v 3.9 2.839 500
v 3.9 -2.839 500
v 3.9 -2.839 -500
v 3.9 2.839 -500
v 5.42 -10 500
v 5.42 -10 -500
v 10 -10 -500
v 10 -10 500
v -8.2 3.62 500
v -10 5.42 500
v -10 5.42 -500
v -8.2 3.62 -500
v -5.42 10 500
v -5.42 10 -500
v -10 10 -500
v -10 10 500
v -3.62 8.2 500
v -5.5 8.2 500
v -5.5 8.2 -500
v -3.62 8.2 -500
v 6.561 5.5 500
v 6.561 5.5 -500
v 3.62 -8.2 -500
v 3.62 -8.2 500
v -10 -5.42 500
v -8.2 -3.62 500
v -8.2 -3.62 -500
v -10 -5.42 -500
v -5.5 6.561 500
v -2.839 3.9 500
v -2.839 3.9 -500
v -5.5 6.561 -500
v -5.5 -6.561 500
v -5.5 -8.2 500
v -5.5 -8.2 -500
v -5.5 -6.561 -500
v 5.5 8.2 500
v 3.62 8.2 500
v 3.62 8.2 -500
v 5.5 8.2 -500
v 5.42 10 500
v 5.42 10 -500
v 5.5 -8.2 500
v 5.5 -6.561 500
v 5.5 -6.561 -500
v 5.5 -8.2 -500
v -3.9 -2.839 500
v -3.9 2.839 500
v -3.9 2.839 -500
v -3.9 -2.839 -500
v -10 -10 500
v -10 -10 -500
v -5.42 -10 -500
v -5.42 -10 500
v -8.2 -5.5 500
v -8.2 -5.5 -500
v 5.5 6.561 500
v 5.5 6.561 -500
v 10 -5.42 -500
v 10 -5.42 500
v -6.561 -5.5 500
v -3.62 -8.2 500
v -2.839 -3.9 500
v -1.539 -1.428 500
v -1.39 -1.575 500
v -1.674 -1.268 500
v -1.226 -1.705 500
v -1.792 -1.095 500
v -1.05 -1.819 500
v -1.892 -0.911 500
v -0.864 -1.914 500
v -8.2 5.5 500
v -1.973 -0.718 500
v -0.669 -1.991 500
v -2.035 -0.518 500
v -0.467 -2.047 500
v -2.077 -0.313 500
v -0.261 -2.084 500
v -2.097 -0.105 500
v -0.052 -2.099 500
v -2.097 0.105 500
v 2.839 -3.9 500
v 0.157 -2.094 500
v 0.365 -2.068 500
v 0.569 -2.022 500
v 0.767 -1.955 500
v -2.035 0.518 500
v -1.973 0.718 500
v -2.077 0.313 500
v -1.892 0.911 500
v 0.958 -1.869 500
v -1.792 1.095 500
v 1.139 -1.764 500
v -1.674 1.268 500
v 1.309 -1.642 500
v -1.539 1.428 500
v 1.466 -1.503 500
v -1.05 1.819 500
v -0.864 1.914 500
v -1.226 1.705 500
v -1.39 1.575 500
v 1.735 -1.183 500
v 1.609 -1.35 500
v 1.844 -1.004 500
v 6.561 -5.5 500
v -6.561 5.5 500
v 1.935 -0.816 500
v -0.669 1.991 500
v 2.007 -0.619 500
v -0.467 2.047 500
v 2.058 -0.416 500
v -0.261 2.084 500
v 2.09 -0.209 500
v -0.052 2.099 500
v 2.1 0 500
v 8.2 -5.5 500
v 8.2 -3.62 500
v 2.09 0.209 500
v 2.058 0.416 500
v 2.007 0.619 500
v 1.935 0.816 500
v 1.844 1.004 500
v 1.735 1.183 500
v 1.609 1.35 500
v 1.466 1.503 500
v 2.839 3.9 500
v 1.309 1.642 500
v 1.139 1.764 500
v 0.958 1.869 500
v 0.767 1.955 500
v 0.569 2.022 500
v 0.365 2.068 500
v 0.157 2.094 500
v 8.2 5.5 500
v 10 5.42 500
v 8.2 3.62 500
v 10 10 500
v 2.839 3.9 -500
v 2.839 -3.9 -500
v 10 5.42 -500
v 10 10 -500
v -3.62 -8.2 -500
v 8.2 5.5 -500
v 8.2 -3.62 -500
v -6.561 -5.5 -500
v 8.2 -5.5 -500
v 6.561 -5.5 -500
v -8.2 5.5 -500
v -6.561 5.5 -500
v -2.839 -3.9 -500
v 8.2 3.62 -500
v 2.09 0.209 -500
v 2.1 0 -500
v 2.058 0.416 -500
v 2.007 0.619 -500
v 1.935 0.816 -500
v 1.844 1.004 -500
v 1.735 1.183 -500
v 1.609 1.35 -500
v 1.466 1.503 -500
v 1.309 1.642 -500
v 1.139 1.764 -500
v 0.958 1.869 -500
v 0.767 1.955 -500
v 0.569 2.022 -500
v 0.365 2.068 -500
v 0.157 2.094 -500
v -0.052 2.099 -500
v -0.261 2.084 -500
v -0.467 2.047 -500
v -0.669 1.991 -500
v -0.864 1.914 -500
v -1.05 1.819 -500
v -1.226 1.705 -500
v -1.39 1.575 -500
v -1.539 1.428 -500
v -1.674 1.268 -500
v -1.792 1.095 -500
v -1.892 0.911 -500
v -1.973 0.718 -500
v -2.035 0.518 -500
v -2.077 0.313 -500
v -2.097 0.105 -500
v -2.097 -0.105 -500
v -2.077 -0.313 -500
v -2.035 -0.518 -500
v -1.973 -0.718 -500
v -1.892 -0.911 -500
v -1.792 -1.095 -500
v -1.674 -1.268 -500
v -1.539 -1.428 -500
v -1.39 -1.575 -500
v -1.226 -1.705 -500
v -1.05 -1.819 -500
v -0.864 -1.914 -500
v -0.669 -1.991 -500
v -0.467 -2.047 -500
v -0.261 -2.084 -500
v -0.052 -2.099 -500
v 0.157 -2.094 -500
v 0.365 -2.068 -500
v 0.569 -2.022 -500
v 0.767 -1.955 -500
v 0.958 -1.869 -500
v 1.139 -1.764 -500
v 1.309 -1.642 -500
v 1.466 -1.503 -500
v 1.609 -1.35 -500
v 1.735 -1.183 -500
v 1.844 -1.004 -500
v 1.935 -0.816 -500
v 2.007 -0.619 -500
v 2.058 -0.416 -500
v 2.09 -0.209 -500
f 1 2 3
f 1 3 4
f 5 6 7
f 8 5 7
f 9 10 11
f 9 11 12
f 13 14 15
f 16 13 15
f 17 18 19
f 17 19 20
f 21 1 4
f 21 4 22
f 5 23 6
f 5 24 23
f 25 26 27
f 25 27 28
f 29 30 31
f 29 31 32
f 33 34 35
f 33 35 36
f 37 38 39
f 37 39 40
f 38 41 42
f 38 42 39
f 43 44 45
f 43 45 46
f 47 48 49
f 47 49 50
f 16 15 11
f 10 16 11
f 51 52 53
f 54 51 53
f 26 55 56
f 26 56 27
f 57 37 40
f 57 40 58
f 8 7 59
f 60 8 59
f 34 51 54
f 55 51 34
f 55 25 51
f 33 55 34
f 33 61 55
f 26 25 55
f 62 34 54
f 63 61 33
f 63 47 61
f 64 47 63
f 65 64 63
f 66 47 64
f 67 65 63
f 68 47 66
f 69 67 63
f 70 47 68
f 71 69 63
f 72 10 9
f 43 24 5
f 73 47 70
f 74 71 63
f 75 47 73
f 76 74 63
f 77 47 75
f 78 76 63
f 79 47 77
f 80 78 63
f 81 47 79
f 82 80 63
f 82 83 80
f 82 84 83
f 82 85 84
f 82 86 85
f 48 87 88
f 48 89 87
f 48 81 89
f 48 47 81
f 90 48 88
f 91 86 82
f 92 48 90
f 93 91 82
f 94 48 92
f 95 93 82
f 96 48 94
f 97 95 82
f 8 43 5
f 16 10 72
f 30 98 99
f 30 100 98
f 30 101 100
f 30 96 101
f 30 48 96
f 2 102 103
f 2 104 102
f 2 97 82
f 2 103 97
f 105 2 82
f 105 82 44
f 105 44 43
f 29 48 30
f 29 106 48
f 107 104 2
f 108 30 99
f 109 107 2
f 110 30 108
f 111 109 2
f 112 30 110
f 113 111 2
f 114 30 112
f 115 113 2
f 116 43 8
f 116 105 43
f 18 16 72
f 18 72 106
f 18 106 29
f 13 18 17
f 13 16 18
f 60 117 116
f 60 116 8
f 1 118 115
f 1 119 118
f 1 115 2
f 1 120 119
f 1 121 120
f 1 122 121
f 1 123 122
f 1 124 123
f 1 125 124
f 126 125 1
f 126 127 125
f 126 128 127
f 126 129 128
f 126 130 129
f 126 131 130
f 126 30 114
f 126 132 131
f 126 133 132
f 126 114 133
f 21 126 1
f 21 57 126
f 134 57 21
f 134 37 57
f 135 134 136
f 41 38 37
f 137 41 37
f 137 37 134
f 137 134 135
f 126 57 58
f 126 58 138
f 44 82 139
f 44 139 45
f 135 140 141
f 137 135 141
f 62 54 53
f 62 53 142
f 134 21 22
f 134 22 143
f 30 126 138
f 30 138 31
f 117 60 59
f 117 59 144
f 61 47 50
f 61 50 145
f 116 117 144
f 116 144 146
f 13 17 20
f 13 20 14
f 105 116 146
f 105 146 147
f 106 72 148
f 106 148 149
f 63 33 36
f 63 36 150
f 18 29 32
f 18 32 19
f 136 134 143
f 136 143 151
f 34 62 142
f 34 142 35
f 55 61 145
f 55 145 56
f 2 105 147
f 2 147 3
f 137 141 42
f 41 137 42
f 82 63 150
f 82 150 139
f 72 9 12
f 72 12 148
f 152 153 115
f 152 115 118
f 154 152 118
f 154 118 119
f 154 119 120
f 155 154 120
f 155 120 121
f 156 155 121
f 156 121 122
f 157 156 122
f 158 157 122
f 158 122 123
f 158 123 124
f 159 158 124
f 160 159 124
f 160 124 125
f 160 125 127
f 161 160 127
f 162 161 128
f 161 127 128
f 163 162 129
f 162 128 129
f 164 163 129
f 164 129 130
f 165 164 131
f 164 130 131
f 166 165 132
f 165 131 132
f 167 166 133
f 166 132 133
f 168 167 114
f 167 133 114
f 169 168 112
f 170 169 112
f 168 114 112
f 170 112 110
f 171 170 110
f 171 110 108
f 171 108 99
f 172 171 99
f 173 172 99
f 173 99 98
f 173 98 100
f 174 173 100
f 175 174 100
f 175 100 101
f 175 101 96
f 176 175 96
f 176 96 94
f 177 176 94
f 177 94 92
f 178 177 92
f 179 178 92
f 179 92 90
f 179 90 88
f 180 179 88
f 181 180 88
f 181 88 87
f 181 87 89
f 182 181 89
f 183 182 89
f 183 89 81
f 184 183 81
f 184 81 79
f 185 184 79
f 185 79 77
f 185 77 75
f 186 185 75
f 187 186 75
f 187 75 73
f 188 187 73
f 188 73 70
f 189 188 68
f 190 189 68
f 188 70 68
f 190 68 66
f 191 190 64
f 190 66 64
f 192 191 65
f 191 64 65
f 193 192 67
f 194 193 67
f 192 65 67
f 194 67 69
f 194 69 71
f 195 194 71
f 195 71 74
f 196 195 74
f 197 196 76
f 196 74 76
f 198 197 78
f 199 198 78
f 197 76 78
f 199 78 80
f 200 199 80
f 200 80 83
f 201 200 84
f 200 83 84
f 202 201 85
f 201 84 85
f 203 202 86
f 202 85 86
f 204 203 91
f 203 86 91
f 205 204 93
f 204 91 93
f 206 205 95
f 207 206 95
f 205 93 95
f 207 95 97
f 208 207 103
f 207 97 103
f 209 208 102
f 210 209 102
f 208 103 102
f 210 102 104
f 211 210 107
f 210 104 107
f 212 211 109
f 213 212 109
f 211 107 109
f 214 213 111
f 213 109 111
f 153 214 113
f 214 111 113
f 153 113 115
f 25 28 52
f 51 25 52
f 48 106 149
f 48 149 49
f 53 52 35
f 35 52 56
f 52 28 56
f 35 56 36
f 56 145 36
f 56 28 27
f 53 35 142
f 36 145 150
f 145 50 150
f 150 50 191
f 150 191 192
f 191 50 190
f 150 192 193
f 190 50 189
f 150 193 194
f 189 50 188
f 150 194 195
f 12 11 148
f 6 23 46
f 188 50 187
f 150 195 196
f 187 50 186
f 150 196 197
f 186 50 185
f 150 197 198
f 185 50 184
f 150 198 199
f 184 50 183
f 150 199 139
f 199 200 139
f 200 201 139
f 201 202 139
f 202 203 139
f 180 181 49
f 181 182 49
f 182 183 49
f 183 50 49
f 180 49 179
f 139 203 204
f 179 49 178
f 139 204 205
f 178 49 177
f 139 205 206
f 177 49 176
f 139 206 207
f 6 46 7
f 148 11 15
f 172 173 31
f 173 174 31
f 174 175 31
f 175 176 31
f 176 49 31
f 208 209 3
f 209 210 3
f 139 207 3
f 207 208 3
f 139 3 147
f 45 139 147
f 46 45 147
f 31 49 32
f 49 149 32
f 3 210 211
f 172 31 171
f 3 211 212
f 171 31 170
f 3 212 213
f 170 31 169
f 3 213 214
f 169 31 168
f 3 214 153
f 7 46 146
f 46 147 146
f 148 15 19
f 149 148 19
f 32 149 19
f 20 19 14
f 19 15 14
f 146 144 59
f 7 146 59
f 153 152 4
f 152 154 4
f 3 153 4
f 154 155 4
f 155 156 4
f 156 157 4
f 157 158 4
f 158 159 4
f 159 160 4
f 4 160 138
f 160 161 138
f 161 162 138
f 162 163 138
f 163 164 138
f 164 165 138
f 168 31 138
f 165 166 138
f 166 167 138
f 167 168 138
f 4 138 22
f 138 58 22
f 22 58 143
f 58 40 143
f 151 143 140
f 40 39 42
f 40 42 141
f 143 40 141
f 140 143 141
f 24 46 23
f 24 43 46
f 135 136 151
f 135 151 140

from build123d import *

# Parameters (mm, degrees)
BOSS_EXTRUDE1_DEPTH = 500
SKETCH2_R           = 2.1
CUT_EXTRUDE1_DEPTH  = 1001.099995


with BuildPart() as part:
    # Sketch1 → Boss-Extrude1 (new, symmetric)
    with BuildSketch(Plane.XY):
        Polygon((5.42, -10), (10, -10), (10, -5.42), (8.2, -3.62), (8.2, -5.5), (6.5606, -5.5), (3.9, -2.8394), (3.9, 0), (3.9, 2.8394), (6.5606, 5.5), (8.2, 5.5), (8.2, 3.62), (10, 5.42), (10, 10), (5.42, 10), (3.62, 8.2), (5.5, 8.2), (5.5, 6.5606), (2.8394, 3.9), (-2.8394, 3.9), (-5.5, 6.5606), (-5.5, 8.2), (-3.62, 8.2), (-5.42, 10), (-10, 10), (-10, 5.42), (-8.2, 3.62), (-8.2, 5.5), (-6.5606, 5.5), (-3.9, 2.8394), (-3.9, 0), (-3.9, -2.8394), (-6.5606, -5.5), (-8.2, -5.5), (-8.2, -3.62), (-10, -5.42), (-10, -10), (-5.42, -10), (-3.62, -8.2), (-5.5, -8.2), (-5.5, -6.5606), (-2.8394, -3.9), (2.8394, -3.9), (5.5, -6.5606), (5.5, -8.2), (3.62, -8.2), align=None)
    extrude(amount=BOSS_EXTRUDE1_DEPTH, both=True)

    # Sketch2 → Cut-Extrude1 (cut, through all)
    with BuildSketch(Plane.XY.offset(500)):
        Circle(SKETCH2_R)
    extrude(amount=-CUT_EXTRUDE1_DEPTH, mode=Mode.SUBTRACT)


solid = part.part
